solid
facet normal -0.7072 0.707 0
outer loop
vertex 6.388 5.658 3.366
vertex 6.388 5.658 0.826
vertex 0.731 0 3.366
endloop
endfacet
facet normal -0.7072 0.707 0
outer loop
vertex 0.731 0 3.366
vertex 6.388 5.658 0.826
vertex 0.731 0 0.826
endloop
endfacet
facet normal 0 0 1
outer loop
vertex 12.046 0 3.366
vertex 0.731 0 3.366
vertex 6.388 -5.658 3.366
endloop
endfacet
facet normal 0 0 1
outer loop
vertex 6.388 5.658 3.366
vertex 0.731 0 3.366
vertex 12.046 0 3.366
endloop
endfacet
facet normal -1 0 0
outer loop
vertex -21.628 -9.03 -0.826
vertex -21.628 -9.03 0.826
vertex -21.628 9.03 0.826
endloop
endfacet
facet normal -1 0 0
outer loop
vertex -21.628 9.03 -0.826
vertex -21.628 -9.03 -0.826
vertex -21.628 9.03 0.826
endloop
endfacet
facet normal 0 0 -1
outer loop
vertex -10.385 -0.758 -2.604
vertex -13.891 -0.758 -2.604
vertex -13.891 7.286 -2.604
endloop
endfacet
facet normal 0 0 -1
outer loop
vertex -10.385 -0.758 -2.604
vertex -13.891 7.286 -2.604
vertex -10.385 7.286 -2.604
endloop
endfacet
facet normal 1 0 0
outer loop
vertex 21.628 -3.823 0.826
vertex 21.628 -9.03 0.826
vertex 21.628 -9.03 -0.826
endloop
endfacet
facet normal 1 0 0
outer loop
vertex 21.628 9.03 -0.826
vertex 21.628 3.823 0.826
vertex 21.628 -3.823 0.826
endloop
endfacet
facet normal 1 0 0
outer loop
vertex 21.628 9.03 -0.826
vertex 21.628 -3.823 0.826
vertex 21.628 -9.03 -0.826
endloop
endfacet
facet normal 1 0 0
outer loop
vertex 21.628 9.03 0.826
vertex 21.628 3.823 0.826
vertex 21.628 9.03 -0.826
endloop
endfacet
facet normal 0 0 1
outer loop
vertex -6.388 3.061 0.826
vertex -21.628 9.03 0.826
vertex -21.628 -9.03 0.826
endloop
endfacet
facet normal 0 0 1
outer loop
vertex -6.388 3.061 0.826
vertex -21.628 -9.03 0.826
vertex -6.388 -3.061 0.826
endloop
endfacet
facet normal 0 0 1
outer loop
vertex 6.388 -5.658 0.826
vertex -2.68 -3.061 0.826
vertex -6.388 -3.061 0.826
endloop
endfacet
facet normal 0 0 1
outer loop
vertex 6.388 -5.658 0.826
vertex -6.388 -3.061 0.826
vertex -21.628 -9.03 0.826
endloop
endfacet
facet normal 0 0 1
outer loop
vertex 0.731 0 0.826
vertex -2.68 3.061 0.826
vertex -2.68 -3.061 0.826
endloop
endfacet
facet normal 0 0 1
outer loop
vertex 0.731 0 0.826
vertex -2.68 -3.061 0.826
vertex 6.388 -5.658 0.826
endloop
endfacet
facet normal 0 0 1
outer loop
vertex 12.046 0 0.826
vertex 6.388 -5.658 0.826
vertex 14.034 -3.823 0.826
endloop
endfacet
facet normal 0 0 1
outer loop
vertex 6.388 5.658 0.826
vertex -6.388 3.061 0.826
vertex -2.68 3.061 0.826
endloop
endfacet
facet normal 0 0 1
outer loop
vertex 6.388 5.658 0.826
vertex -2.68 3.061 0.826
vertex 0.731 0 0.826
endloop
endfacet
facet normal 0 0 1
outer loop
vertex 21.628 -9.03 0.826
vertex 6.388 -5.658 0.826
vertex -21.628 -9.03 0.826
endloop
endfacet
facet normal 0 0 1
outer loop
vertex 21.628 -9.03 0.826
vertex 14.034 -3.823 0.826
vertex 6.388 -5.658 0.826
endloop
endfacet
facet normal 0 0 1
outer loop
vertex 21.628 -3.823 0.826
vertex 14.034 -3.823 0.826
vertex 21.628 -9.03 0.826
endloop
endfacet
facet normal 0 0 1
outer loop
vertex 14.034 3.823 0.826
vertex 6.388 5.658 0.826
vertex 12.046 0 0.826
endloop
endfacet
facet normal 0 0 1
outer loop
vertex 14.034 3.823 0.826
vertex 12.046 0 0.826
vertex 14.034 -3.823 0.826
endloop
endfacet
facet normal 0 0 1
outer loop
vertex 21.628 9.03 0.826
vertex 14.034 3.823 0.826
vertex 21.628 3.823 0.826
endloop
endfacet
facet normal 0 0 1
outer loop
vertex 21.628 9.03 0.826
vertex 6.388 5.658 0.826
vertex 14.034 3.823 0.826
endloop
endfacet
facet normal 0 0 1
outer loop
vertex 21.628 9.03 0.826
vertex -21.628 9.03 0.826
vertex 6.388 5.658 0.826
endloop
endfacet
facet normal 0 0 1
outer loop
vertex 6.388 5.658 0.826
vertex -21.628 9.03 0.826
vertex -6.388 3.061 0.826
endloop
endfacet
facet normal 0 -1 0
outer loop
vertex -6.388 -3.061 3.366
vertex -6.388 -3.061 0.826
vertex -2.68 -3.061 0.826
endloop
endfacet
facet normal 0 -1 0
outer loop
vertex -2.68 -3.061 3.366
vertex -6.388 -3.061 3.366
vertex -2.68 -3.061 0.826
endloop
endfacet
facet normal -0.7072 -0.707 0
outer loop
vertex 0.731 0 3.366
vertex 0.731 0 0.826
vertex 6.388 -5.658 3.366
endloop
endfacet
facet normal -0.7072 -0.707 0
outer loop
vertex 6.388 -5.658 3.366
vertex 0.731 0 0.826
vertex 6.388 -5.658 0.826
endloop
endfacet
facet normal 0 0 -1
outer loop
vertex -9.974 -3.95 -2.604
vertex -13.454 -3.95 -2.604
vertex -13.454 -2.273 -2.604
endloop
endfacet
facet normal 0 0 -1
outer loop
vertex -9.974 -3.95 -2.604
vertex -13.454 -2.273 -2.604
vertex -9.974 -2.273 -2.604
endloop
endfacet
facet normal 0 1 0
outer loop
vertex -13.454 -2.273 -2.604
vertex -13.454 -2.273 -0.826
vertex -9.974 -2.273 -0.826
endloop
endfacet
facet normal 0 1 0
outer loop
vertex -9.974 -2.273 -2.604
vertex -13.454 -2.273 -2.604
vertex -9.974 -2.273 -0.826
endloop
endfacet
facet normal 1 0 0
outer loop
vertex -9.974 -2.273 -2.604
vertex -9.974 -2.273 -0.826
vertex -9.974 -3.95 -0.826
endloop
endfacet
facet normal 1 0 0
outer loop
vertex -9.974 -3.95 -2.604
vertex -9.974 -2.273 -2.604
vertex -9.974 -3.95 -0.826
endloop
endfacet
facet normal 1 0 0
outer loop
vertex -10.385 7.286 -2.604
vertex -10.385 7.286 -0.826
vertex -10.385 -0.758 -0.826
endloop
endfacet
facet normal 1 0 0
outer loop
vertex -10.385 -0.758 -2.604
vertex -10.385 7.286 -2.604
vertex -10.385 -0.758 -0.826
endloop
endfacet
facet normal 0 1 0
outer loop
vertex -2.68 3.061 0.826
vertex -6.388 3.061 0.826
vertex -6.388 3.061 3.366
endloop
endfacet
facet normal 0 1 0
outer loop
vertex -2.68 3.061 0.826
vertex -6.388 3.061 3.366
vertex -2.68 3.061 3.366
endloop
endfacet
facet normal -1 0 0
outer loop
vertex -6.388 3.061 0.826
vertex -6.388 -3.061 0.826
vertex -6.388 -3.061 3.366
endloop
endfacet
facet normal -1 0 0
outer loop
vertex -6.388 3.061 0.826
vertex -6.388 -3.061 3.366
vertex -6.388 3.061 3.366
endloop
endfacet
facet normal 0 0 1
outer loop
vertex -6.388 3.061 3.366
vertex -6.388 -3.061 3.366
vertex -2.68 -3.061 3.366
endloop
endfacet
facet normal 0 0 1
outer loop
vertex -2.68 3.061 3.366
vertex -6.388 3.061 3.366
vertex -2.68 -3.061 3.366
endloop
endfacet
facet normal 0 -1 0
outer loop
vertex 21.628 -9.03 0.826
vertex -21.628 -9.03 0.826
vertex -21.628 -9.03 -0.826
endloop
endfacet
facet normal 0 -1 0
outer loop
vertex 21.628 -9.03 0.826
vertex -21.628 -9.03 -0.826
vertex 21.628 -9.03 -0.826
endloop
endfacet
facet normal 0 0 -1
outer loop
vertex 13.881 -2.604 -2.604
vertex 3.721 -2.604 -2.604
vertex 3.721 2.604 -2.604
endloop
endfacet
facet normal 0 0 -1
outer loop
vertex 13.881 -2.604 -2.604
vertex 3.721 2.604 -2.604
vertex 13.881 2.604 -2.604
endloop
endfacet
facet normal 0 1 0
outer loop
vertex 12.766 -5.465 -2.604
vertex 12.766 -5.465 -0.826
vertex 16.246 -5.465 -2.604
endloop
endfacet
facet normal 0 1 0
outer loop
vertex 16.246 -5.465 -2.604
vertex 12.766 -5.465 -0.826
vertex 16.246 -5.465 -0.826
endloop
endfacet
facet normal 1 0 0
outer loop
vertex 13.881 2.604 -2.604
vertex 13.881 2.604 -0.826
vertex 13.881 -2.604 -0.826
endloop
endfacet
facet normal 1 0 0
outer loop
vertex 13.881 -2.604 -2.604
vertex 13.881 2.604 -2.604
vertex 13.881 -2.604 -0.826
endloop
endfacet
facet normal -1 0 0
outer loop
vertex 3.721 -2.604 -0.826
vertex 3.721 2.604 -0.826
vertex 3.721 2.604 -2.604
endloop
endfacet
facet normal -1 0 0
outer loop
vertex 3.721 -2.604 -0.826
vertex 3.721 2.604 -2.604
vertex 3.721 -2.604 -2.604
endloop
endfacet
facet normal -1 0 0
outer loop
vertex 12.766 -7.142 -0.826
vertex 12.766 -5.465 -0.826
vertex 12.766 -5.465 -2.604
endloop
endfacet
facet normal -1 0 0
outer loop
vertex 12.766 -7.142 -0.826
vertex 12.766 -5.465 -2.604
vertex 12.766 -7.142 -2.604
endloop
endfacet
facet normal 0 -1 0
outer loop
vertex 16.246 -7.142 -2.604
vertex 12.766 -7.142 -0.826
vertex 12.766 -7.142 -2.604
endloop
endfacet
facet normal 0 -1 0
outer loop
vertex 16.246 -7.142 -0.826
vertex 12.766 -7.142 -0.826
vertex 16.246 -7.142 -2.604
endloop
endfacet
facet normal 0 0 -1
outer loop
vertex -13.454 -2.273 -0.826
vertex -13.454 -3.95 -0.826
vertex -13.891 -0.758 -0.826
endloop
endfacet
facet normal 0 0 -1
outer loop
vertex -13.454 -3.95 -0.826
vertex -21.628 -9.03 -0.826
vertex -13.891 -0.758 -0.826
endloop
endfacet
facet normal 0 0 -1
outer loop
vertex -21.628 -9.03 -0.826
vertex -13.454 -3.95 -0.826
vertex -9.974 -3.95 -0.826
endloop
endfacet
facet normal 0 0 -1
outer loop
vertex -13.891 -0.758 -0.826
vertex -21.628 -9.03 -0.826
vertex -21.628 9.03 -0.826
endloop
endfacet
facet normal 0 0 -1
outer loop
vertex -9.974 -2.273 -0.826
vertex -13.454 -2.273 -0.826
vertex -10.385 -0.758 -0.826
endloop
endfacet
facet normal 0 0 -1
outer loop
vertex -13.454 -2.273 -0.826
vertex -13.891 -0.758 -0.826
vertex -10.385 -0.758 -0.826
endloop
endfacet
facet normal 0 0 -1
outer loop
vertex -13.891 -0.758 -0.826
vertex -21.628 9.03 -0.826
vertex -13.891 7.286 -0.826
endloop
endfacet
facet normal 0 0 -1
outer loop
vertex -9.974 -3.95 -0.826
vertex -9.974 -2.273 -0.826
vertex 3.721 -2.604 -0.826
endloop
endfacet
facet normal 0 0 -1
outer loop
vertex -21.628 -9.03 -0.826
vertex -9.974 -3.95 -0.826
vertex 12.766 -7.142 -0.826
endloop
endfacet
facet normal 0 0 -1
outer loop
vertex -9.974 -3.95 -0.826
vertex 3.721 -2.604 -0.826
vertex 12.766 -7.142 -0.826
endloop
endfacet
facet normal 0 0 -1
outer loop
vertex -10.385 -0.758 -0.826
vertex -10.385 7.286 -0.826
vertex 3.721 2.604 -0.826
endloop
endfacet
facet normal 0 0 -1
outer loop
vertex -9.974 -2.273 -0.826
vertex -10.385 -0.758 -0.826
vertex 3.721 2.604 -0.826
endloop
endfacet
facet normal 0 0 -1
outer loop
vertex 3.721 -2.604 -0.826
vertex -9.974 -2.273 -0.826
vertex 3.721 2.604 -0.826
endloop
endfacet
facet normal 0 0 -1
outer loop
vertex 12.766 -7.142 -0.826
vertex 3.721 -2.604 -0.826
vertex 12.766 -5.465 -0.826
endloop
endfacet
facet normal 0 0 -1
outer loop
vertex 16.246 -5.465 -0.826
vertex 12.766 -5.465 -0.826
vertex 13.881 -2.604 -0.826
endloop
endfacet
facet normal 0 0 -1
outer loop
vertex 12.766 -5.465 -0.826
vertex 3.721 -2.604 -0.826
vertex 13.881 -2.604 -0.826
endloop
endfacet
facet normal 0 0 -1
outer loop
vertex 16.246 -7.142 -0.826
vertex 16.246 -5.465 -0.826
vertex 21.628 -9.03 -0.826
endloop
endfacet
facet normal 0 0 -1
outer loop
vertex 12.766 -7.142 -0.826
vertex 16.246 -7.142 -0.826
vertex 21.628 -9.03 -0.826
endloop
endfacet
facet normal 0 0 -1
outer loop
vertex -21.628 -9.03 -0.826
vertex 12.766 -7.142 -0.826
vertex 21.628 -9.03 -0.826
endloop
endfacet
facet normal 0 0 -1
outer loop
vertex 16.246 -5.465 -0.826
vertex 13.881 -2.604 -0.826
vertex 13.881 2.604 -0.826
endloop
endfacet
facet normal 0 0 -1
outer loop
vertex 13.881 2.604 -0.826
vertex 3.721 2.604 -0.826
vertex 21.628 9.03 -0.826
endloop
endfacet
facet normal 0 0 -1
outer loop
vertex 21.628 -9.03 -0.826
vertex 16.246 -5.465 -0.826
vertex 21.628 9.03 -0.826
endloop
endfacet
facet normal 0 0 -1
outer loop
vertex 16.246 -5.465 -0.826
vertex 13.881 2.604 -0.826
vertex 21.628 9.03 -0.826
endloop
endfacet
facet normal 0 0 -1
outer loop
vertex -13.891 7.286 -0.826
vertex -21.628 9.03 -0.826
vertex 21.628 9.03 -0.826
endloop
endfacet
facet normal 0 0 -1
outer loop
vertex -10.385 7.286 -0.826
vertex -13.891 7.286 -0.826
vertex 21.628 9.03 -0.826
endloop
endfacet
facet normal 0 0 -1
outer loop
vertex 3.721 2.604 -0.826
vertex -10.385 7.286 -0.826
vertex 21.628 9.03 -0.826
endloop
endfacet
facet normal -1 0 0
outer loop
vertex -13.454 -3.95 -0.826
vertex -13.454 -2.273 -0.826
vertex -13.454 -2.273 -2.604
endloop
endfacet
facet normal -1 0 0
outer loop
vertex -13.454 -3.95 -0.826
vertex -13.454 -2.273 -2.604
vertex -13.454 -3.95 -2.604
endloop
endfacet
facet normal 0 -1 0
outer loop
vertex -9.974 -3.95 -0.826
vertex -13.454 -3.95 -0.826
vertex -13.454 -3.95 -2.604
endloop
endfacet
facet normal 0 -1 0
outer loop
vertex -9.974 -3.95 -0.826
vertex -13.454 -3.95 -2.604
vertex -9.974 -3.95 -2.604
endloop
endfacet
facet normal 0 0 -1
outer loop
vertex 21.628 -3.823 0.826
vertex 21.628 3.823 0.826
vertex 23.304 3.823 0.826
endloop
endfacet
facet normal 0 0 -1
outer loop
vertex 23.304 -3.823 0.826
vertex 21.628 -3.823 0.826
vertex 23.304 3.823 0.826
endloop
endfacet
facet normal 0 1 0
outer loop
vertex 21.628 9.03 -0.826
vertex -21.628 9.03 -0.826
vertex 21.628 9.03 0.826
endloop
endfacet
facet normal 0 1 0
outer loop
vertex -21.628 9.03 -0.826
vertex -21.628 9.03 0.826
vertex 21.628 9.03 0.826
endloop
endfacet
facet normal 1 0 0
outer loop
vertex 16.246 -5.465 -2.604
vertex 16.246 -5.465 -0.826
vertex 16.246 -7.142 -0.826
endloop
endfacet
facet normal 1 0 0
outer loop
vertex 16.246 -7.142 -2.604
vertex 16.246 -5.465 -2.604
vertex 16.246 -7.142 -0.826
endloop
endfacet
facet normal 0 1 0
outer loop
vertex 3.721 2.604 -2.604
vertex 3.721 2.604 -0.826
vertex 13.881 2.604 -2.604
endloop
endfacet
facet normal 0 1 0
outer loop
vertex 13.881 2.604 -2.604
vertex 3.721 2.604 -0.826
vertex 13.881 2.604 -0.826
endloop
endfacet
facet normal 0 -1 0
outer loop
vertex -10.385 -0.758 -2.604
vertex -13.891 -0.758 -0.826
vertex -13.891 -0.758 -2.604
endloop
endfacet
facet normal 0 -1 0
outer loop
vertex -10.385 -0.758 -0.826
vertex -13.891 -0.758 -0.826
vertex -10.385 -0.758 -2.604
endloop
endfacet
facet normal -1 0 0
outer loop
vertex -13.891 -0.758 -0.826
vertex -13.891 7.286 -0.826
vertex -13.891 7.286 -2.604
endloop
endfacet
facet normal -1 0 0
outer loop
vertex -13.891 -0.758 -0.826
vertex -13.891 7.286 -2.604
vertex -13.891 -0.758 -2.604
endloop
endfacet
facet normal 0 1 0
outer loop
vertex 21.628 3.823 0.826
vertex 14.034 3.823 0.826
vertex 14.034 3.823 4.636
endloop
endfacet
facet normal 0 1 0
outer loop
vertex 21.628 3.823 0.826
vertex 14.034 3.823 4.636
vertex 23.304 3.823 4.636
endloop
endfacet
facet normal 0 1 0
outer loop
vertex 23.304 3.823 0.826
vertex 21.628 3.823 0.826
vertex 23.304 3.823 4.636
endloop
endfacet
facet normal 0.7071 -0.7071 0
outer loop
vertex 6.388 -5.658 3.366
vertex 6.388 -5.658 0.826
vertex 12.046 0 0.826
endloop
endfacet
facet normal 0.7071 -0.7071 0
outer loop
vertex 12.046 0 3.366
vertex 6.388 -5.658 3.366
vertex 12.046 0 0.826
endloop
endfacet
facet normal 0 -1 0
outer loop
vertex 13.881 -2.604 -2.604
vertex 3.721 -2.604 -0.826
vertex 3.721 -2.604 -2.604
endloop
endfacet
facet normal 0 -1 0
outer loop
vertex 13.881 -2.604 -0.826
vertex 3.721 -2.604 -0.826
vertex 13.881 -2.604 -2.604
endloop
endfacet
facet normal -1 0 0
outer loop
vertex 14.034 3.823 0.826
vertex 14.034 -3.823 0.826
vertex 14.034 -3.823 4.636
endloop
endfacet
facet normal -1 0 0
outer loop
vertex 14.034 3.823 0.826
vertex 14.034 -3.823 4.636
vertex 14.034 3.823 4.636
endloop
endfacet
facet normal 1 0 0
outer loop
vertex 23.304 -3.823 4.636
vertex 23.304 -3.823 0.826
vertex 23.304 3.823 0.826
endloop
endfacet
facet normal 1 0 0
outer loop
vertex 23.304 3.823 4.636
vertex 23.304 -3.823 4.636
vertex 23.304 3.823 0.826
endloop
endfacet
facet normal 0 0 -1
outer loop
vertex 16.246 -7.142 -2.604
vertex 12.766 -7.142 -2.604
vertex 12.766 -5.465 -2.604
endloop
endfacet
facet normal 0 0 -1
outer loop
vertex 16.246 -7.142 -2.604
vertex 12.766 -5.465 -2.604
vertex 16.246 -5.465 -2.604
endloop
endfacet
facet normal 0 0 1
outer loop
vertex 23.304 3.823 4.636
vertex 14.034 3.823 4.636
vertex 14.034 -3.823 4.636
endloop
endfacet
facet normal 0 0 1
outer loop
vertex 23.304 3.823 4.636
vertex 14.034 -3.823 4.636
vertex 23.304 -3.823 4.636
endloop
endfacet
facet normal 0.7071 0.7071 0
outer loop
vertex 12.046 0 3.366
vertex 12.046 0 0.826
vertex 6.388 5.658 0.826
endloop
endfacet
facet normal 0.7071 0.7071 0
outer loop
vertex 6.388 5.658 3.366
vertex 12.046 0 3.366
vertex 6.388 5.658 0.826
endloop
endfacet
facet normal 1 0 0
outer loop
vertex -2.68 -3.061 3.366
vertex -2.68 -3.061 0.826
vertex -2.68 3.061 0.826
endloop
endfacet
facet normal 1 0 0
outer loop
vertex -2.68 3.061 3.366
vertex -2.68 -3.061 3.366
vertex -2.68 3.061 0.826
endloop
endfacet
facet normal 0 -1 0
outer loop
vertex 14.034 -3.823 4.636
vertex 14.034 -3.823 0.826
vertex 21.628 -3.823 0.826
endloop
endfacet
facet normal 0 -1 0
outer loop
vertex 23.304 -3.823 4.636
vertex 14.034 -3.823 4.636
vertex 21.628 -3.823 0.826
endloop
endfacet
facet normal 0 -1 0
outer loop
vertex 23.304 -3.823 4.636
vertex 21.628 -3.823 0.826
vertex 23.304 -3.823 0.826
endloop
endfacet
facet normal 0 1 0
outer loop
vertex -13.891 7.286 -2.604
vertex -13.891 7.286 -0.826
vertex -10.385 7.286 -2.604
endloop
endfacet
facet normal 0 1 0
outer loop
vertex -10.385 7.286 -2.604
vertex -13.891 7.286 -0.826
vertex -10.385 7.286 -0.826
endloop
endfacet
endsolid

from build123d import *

# Parameters (mm, degrees)
F0_W     = 43.2562
F0_H     = 18.0594
F1_DEPTH = 0.8255
F2_W     = 9.271
F2_H     = 7.6454
F3_DEPTH = 3.81
F4_W     = 3.7084
F4_H     = 6.1214
F5_DEPTH = 2.54
F6_W     = 10.16
F6_H     = 5.207
F6_W_2   = 3.4798
F6_H_2   = 1.6764
F6_W_3   = 3.5052
F6_H_3   = 8.043443
F7_DEPTH = 1.778


with BuildPart() as f1:
    # F0 (on Top) → F1 (new body, symmetric)
    with BuildSketch(Plane.XY):
        Rectangle(F0_W, F0_H)
    extrude(amount=F1_DEPTH, both=True)

    # F2 (on face) → F3 (join)
    with BuildSketch(Plane.XY.offset(0.8255)):
        with Locations((18.669, 0)):
            Rectangle(F2_W, F2_H)
    extrude(amount=F3_DEPTH)

    # F4 (on face) → F5 (join)
    with BuildSketch(Plane.XY.offset(0.8255)):
        with Locations((-4.5339, 0)):
            Rectangle(F4_W, F4_H)
        Polygon((12.045661, 0), (6.3881, 5.657561), (0.730539, 0), (6.3881, -5.657561), align=None)
    extrude(amount=F5_DEPTH)

    # F6 (on face) → F7 (join)
    with BuildSketch(Plane(origin=(0, 0, -0.8255), x_dir=(1, 0, 0), z_dir=(0, 0, -1))):
        with Locations((8.8011, 0)):
            Rectangle(F6_W, F6_H)
        with Locations((14.50628, 6.303569)):
            Rectangle(F6_W_2, F6_H_2)
        with Locations((-12.138053, -3.263815)):
            Rectangle(F6_W_3, F6_H_3)
        with Locations((-11.713614, 3.1115)):
            Rectangle(F6_W_2, F6_H_2)
    extrude(amount=F7_DEPTH)


solid = f1.part
